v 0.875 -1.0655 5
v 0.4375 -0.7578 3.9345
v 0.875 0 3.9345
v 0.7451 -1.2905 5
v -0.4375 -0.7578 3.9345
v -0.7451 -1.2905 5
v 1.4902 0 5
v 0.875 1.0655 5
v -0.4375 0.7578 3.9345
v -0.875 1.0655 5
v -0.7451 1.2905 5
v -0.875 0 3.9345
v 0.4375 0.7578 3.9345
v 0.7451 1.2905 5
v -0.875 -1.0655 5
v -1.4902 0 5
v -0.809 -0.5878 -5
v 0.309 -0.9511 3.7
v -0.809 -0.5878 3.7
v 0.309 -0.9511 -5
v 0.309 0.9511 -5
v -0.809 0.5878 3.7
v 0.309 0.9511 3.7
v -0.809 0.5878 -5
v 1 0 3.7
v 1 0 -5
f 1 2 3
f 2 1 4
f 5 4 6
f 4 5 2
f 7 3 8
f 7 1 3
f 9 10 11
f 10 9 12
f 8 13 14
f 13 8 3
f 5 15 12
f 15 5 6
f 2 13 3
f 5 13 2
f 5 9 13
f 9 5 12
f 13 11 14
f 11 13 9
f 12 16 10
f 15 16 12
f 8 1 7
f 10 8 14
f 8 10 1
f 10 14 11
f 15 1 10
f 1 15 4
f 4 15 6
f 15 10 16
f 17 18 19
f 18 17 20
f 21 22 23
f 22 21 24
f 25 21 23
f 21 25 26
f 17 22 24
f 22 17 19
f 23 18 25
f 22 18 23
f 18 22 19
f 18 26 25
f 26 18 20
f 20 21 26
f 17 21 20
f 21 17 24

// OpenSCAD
// Parameters
shaft_diameter_mm = 2.0; //[1.0:4.0:0.1]
length_mm = 10.0; //[5.0:20.0:0.5]
head_diameter_mm = 3.5; //[2.0:7.0:0.1]
head_height_mm = 1.3; //[0.7:2.6:0.05]
socket_diameter_mm = 1.2; //[0.6:2.4:0.05]
socket_depth_mm = 0.7; //[0.3:1.3:0.05]
threaded_enabled = 0; //[0:1:1]
thread_diameter_mm = 2.0; //[1.0:4.0:0.1]
thread_length_mm = 7.0; //[3.0:18.0:0.5]
pcb_spacer_enabled = 0; //[0:1:1]
pcb_spacer_height_mm = 3.0; //[1.5:6.0:0.5]
pcb_spacer_wall_mm = 1.0; //[0.6:2.0:0.1]
pcb_spacer_clearance_mm = 0.2; //[0.1:0.5:0.05]
washer_enabled = 0; //[0:1:1]
washer_outer_diameter_mm = 5.0; //[3.0:10.0:0.1]
washer_thickness_mm = 0.5; //[0.2:1.5:0.05]
washer_clearance_mm = 0.3; //[0.1:0.8:0.05]
buzzer_enabled = 0; //[0:1:1]
buzzer_diameter_mm = 12.0; //[6.0:24.0:0.5]
buzzer_height_mm = 6.0; //[3.0:12.0:0.5]
overlap_mm = 0.8; //[0.5:2.0:0.1]

// Screw and Washer - complete geometry
module screw_and_washer() {
  color("DimGray") {
    // Screw Shaft
    translate([0, 0, -head_height_mm/2])
      cylinder(h=length_mm - head_height_mm, r=shaft_diameter_mm/2, center=true);

    // Dome Head
    intersection() {
      translate([0, 0, length_mm/2 - head_height_mm + head_diameter_mm/2])
        sphere(r=head_diameter_mm/2, center=true);
      translate([0, 0, length_mm/2 - head_height_mm/2])
        cube([head_diameter_mm*2, head_diameter_mm*2, head_height_mm], center=true);
    }

    // Drive Socket Recess
    translate([0, 0, length_mm/2 - socket_depth_mm/2])
      cylinder(h=socket_depth_mm, r=socket_diameter_mm/2, center=true);
  }

  if (washer_enabled) {
    color("Silver") {
      // Washer
      difference() {
        translate([0, 0, length_mm/2 - head_height_mm - washer_thickness_mm/2 + overlap_mm])
          cylinder(h=washer_thickness_mm, r=washer_outer_diameter_mm/2, center=true);
        translate([0, 0, length_mm/2 - head_height_mm - washer_thickness_mm/2 + overlap_mm])
          cylinder(h=washer_thickness_mm + overlap_mm*2, r=shaft_diameter_mm/2 + washer_clearance_mm, center=true);
      }
    }
  }
}

// PCB Spacer - complete geometry
module pcb_spacer() {
  if (pcb_spacer_enabled) {
    color("Silver") {
      difference() {
        translate([0, 0, length_mm/2 - head_height_mm - pcb_spacer_height_mm/2 + overlap_mm])
          cylinder(h=pcb_spacer_height_mm, r=shaft_diameter_mm/2 + pcb_spacer_clearance_mm + pcb_spacer_wall_mm, center=true);
        translate([0, 0, length_mm/2 - head_height_mm - pcb_spacer_height_mm/2 + overlap_mm])
          cylinder(h=pcb_spacer_height_mm + overlap_mm*2, r=shaft_diameter_mm/2 + pcb_spacer_clearance_mm, center=true);
      }
    }
  }
}

// Buzzer - complete geometry
module buzzer() {
  if (buzzer_enabled) {
    color("Black") {
      translate([buzzer_diameter_mm/2 + washer_outer_diameter_mm/2 - overlap_mm, 0, length_mm/2 - head_height_mm - washer_thickness_mm/2 + overlap_mm])
        cylinder(h=buzzer_height_mm, r=buzzer_diameter_mm/2, center=true);
    }
  }
}

// Assembly
module assembly() {
  screw_and_washer();
  pcb_spacer();
  buzzer();
}

assembly();
